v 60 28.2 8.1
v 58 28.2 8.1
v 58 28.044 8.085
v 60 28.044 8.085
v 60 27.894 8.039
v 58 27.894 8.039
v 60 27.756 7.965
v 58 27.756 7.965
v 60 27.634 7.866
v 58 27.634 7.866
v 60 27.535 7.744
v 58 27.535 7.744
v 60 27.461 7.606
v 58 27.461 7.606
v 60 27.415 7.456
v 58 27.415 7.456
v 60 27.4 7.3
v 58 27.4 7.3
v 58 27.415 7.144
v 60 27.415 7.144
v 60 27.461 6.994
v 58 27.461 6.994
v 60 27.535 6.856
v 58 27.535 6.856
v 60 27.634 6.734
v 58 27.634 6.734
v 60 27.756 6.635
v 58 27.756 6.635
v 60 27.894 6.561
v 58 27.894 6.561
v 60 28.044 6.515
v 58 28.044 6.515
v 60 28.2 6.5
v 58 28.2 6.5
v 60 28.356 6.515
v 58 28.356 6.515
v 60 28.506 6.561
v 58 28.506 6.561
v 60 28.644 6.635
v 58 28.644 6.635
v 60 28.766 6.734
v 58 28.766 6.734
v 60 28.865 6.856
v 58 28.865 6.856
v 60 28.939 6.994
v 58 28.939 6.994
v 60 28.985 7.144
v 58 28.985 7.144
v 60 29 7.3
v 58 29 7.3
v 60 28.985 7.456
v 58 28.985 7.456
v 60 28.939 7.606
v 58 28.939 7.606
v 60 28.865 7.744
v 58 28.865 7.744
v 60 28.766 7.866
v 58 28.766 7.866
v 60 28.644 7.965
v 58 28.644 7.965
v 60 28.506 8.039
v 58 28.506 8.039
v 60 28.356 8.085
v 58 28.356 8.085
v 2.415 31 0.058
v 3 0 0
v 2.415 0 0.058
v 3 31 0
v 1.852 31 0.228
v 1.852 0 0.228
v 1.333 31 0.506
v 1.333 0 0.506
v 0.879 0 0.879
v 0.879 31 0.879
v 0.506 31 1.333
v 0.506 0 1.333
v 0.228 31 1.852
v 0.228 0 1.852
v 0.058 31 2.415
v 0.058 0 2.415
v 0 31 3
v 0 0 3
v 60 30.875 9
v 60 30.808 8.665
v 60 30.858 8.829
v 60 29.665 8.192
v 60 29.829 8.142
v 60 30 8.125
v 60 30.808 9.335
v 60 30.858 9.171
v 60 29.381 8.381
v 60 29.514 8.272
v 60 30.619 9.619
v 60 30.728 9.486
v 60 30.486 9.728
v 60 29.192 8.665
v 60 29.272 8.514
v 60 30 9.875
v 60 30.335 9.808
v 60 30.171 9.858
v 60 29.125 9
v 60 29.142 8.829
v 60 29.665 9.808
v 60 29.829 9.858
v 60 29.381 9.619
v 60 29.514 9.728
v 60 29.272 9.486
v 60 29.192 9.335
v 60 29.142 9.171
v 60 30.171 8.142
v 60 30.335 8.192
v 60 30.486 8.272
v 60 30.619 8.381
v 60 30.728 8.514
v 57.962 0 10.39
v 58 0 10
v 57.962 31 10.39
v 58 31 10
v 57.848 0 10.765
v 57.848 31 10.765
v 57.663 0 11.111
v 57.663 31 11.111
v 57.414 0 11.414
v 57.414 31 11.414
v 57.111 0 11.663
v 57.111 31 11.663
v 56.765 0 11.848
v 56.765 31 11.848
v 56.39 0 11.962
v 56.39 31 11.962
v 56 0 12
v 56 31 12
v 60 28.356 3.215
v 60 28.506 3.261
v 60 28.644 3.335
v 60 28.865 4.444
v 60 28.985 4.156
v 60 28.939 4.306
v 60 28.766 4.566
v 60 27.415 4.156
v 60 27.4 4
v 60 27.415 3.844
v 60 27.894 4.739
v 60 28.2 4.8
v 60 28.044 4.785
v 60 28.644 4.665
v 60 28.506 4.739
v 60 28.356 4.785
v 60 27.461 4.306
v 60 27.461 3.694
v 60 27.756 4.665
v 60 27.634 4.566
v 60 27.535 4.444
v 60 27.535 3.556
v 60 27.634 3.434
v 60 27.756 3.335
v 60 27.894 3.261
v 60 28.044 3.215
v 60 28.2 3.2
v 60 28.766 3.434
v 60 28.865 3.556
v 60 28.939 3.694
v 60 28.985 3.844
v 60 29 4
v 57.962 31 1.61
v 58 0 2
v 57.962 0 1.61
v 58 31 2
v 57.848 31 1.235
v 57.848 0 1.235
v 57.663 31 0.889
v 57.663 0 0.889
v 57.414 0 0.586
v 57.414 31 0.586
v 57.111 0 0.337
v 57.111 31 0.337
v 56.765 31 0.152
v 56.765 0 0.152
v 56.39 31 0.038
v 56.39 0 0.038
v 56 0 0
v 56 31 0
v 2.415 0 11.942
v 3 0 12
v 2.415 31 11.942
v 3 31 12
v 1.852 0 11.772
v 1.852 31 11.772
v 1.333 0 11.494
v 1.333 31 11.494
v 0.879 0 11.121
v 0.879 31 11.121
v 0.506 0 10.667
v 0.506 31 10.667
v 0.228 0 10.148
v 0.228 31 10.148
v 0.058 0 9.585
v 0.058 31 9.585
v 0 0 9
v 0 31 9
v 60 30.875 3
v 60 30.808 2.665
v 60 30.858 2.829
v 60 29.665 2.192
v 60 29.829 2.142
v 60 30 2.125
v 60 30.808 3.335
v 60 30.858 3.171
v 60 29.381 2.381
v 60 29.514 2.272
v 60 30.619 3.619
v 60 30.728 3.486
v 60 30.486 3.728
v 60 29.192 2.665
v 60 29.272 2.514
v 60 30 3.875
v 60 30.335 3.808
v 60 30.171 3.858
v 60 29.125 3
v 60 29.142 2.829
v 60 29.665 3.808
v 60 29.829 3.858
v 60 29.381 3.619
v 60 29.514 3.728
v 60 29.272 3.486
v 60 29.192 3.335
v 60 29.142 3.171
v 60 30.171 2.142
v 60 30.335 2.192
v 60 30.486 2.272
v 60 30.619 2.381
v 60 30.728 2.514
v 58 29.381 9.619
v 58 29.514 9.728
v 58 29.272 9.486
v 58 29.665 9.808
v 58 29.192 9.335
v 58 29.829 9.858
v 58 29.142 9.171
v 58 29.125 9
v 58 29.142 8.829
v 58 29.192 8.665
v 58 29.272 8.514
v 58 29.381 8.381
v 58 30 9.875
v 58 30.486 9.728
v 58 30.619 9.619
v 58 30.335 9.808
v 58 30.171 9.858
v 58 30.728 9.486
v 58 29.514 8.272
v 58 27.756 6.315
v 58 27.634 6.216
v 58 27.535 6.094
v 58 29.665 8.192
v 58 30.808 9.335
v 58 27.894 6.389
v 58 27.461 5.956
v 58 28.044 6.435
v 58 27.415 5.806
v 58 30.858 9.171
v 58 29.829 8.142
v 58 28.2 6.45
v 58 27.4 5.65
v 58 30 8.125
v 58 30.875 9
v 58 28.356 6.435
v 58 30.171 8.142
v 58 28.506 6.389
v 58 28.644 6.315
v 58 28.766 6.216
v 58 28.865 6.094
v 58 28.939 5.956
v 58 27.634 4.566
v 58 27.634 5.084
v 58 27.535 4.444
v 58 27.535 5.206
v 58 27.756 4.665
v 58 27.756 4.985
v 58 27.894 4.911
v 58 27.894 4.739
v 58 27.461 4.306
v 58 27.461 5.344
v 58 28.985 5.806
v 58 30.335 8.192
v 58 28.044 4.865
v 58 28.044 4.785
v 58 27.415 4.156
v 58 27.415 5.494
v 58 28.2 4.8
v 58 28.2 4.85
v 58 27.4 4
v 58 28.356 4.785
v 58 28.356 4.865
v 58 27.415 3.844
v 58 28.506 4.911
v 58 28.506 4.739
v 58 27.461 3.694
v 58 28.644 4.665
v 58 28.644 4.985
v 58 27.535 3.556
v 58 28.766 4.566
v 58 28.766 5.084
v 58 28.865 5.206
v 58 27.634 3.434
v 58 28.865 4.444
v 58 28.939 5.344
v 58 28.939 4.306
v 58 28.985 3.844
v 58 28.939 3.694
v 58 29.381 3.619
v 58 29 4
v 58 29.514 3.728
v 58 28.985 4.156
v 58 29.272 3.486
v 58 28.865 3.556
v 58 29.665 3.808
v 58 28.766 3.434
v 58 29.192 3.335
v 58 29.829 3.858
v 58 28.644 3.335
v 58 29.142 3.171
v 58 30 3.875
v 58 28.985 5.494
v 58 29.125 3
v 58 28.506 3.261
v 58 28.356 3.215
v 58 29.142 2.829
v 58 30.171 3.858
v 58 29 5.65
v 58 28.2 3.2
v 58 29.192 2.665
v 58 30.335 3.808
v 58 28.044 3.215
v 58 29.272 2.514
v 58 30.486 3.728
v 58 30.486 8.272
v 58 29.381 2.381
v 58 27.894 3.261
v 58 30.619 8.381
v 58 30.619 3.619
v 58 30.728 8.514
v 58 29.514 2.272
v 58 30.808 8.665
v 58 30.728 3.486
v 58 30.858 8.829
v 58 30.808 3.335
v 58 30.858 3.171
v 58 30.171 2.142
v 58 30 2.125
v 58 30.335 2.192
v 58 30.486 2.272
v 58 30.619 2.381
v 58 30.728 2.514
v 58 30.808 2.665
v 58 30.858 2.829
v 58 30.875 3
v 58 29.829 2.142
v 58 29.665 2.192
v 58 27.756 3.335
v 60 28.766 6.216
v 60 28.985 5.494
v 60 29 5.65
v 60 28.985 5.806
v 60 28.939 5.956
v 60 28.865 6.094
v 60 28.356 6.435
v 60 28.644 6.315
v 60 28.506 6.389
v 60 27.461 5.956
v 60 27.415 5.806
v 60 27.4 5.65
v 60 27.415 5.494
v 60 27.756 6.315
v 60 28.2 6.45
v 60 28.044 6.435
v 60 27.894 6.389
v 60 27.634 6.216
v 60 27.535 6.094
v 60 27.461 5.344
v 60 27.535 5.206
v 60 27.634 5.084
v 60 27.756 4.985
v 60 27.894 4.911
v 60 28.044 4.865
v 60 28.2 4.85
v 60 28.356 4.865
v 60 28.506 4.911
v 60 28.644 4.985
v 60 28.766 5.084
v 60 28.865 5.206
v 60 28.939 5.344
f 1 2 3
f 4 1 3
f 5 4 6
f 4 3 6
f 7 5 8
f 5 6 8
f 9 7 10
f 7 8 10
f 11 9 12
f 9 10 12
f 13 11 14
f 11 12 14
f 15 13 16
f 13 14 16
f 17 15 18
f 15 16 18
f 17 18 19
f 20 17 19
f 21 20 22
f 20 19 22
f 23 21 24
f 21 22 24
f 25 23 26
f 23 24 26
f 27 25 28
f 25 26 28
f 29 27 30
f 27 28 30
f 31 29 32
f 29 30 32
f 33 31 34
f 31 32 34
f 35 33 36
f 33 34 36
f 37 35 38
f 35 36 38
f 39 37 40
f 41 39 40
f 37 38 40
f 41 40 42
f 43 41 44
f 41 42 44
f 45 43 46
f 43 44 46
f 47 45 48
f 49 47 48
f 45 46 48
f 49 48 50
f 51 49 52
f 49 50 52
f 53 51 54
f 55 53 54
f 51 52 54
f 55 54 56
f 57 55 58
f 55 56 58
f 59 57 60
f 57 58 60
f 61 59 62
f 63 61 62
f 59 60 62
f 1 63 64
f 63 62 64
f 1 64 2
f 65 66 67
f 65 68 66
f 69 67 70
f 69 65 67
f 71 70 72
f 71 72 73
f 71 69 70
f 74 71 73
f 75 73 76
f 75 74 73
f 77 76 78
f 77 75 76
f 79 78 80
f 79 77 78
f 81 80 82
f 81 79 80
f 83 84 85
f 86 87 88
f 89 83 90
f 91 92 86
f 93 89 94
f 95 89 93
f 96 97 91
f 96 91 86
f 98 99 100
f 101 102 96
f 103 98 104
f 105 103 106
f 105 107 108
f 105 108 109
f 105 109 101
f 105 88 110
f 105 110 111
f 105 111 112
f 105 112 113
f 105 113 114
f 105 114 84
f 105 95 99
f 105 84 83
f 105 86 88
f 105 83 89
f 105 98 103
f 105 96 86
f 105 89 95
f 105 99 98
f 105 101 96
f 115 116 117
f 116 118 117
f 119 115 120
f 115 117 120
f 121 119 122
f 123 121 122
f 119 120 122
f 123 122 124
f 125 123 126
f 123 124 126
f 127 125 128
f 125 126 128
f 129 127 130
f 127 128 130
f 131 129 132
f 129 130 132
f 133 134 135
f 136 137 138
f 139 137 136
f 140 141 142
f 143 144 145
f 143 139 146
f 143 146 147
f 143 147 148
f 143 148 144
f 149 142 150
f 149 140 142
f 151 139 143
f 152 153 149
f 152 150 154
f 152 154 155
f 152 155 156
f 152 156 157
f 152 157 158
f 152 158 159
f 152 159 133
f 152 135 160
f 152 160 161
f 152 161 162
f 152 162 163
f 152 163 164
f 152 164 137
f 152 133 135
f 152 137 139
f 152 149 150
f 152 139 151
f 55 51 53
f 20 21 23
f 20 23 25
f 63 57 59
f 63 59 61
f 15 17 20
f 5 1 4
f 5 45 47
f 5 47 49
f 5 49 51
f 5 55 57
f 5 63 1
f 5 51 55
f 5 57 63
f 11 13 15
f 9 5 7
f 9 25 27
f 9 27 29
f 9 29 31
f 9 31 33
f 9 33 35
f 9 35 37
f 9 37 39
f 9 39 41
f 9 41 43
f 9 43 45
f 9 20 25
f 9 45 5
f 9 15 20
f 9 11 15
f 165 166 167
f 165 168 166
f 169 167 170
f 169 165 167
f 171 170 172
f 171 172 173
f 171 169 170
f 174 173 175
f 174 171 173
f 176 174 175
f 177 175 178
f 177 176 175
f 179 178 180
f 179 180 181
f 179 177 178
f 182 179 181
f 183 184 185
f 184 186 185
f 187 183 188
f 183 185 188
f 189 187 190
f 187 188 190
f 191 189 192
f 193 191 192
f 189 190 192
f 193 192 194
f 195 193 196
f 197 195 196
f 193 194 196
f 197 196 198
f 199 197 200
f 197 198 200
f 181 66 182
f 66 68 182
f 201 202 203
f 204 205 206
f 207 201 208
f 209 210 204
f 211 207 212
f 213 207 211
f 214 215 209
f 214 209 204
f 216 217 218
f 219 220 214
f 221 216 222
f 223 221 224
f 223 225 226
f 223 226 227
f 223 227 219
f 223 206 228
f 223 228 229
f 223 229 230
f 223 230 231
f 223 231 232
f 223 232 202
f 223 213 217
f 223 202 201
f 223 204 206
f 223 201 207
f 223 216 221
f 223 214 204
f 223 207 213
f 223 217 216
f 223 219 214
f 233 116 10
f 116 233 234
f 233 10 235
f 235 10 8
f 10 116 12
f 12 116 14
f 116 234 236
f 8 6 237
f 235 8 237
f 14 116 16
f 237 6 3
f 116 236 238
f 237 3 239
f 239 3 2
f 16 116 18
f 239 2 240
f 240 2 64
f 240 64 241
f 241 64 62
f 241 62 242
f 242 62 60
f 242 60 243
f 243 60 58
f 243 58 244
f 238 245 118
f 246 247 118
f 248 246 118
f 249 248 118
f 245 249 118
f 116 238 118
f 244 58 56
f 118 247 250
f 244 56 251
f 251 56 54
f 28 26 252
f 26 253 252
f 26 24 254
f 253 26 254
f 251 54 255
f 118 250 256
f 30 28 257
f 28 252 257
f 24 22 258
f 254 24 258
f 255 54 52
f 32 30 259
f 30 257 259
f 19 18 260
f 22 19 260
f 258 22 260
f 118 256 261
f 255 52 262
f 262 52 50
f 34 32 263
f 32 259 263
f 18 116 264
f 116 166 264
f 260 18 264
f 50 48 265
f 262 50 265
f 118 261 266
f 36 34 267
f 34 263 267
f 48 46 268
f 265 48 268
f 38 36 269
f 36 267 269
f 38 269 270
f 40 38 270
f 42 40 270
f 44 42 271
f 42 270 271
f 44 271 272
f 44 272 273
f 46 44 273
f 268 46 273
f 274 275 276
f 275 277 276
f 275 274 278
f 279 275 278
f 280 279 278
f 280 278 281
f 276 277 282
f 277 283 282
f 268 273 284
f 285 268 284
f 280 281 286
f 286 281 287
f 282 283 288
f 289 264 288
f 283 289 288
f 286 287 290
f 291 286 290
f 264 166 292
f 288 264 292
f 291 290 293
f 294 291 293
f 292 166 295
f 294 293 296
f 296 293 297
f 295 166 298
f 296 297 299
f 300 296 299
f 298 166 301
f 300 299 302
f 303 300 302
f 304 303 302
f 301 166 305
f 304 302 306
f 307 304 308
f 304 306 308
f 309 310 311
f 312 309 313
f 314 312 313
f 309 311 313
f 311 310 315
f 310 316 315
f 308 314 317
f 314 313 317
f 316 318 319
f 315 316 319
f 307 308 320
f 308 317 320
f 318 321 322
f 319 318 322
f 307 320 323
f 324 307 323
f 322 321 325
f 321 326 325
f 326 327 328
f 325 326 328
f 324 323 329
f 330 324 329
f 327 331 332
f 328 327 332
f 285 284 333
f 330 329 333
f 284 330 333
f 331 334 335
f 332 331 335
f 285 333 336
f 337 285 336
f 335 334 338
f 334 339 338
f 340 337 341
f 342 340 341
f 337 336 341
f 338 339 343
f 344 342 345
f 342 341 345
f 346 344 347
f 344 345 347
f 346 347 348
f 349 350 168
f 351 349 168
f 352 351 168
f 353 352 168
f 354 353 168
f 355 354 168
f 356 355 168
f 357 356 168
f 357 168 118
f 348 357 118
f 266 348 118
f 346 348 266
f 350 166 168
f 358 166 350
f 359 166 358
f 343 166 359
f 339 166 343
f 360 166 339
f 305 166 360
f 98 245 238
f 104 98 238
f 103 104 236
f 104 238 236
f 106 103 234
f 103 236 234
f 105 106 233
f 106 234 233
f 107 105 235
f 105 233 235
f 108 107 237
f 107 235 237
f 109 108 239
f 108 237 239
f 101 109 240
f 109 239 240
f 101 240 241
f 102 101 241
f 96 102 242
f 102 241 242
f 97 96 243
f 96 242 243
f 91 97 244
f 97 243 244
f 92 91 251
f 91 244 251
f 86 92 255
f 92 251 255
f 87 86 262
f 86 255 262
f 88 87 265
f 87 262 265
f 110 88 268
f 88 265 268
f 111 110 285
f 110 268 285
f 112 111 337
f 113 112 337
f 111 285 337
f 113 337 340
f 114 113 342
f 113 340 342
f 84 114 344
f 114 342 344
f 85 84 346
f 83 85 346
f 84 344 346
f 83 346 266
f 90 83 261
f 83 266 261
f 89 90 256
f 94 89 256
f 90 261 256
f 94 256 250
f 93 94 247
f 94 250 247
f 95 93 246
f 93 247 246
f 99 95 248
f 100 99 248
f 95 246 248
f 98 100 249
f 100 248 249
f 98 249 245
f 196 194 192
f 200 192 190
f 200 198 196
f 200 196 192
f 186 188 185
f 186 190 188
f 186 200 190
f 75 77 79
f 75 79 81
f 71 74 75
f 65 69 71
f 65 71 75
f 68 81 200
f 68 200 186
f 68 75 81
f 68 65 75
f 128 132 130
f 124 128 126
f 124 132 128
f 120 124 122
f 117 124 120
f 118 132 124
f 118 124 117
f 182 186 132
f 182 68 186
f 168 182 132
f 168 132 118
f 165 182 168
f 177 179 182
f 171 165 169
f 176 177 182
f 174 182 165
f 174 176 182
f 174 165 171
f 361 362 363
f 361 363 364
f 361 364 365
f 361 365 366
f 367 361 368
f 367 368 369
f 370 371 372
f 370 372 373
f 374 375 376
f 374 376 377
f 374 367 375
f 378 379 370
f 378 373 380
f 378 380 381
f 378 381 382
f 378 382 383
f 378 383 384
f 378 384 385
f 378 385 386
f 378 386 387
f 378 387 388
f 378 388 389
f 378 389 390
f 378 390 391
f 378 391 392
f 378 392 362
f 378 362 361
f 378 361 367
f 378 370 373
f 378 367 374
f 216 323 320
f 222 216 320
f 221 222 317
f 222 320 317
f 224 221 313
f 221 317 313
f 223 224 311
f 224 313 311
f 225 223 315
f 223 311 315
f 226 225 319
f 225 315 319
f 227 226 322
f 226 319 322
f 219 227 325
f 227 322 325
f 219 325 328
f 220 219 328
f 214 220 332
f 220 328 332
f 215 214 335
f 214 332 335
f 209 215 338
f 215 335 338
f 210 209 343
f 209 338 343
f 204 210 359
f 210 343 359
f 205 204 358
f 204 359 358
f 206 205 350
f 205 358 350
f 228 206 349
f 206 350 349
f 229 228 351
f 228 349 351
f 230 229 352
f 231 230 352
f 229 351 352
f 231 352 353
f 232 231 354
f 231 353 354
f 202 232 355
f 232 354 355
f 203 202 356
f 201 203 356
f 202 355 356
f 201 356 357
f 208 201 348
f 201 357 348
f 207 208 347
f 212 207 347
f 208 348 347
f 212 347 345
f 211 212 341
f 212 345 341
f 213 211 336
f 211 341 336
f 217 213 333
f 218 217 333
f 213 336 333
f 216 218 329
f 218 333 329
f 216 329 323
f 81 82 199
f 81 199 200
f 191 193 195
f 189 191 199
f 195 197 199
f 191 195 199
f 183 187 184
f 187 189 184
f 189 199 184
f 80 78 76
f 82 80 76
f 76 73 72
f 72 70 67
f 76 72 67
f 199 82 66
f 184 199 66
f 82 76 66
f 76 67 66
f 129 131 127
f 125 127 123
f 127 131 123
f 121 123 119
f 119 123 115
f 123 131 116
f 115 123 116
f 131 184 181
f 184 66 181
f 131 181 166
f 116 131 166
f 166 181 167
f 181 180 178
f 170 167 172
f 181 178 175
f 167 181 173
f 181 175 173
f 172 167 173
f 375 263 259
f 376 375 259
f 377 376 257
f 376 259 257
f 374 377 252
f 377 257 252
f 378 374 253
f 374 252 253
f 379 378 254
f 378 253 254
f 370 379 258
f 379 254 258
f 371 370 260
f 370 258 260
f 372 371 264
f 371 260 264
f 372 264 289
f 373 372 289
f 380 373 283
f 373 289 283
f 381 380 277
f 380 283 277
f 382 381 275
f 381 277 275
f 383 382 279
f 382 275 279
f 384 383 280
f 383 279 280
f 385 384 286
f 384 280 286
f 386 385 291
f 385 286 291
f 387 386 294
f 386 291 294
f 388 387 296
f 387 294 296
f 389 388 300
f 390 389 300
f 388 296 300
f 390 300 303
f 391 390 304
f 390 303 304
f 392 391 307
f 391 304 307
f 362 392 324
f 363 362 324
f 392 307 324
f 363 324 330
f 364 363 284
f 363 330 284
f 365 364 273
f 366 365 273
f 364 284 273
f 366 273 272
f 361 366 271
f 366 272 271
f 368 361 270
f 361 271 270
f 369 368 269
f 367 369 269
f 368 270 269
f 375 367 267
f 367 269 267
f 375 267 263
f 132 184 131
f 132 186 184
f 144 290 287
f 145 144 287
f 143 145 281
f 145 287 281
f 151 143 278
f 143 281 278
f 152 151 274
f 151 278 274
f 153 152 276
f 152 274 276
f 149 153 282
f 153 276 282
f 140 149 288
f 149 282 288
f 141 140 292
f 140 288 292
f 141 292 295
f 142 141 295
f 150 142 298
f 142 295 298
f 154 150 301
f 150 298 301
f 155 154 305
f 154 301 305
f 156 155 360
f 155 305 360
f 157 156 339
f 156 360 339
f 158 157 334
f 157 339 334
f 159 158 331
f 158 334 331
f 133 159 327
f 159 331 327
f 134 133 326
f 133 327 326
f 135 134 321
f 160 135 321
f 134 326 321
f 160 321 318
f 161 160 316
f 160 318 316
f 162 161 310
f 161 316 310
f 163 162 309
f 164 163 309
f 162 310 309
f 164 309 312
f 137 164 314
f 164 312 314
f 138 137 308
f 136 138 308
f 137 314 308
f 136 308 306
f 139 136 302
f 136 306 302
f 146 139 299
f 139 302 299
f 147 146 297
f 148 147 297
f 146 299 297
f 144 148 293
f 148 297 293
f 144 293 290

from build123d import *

# Parameters (mm, degrees)
SKIZZE1_W                       = 58
SKIZZE1_H                       = 31
AUFSATZ_LINEAR_AUSTRAGEN1_DEPTH = 12
VERRUNDUNG1_R                   = 2
VERRUNDUNG2_R                   = 3
SKIZZE3_R                       = 0.875
SKIZZE3_R_2                     = 0.8
AUFSATZ_LINEAR_AUSTRAGEN2_DEPTH = 2


with BuildPart() as part:
    # Skizze1 → Aufsatz-Linear austragen1 (new body)
    with BuildSketch(Plane.XY):
        with Locations((29, 15.5)):
            Rectangle(SKIZZE1_W, SKIZZE1_H)
    extrude(amount=AUFSATZ_LINEAR_AUSTRAGEN1_DEPTH)

    # Verrundung1
    verrundung1_edges = [part.edges().sort_by_distance(p)[0] for p in [
        (58, 15.5, 12),
        (58, 15.5, 0),
    ]]
    fillet(verrundung1_edges, radius=VERRUNDUNG1_R)

    # Verrundung2
    verrundung2_edges = [part.edges().sort_by_distance(p)[0] for p in [
        (0, 15.5, 12),
        (0, 15.5, 0),
    ]]
    fillet(verrundung2_edges, radius=VERRUNDUNG2_R)

    # Skizze3 → Aufsatz-Linear austragen2 (add)
    with BuildSketch(Plane(origin=(58, 0, 0), x_dir=(0, 0, -1), z_dir=(1, 0, 0))):
        with Locations(Location((-9, 30, 0), (0, 0, 180))):
            Circle(SKIZZE3_R)
        with Locations(Location((-3, 30, 0), (0, 0, 180))):
            Circle(SKIZZE3_R)
        with Locations(Location((-4, 28.2, 0), (0, 0, 180))):
            Circle(SKIZZE3_R_2)
        with Locations(Location((-5.65, 28.2, 0), (0, 0, 180))):
            Circle(SKIZZE3_R_2)
        with Locations(Location((-7.3, 28.2, 0), (0, 0, 180))):
            Circle(SKIZZE3_R_2)
    extrude(amount=AUFSATZ_LINEAR_AUSTRAGEN2_DEPTH)


solid = part.part
